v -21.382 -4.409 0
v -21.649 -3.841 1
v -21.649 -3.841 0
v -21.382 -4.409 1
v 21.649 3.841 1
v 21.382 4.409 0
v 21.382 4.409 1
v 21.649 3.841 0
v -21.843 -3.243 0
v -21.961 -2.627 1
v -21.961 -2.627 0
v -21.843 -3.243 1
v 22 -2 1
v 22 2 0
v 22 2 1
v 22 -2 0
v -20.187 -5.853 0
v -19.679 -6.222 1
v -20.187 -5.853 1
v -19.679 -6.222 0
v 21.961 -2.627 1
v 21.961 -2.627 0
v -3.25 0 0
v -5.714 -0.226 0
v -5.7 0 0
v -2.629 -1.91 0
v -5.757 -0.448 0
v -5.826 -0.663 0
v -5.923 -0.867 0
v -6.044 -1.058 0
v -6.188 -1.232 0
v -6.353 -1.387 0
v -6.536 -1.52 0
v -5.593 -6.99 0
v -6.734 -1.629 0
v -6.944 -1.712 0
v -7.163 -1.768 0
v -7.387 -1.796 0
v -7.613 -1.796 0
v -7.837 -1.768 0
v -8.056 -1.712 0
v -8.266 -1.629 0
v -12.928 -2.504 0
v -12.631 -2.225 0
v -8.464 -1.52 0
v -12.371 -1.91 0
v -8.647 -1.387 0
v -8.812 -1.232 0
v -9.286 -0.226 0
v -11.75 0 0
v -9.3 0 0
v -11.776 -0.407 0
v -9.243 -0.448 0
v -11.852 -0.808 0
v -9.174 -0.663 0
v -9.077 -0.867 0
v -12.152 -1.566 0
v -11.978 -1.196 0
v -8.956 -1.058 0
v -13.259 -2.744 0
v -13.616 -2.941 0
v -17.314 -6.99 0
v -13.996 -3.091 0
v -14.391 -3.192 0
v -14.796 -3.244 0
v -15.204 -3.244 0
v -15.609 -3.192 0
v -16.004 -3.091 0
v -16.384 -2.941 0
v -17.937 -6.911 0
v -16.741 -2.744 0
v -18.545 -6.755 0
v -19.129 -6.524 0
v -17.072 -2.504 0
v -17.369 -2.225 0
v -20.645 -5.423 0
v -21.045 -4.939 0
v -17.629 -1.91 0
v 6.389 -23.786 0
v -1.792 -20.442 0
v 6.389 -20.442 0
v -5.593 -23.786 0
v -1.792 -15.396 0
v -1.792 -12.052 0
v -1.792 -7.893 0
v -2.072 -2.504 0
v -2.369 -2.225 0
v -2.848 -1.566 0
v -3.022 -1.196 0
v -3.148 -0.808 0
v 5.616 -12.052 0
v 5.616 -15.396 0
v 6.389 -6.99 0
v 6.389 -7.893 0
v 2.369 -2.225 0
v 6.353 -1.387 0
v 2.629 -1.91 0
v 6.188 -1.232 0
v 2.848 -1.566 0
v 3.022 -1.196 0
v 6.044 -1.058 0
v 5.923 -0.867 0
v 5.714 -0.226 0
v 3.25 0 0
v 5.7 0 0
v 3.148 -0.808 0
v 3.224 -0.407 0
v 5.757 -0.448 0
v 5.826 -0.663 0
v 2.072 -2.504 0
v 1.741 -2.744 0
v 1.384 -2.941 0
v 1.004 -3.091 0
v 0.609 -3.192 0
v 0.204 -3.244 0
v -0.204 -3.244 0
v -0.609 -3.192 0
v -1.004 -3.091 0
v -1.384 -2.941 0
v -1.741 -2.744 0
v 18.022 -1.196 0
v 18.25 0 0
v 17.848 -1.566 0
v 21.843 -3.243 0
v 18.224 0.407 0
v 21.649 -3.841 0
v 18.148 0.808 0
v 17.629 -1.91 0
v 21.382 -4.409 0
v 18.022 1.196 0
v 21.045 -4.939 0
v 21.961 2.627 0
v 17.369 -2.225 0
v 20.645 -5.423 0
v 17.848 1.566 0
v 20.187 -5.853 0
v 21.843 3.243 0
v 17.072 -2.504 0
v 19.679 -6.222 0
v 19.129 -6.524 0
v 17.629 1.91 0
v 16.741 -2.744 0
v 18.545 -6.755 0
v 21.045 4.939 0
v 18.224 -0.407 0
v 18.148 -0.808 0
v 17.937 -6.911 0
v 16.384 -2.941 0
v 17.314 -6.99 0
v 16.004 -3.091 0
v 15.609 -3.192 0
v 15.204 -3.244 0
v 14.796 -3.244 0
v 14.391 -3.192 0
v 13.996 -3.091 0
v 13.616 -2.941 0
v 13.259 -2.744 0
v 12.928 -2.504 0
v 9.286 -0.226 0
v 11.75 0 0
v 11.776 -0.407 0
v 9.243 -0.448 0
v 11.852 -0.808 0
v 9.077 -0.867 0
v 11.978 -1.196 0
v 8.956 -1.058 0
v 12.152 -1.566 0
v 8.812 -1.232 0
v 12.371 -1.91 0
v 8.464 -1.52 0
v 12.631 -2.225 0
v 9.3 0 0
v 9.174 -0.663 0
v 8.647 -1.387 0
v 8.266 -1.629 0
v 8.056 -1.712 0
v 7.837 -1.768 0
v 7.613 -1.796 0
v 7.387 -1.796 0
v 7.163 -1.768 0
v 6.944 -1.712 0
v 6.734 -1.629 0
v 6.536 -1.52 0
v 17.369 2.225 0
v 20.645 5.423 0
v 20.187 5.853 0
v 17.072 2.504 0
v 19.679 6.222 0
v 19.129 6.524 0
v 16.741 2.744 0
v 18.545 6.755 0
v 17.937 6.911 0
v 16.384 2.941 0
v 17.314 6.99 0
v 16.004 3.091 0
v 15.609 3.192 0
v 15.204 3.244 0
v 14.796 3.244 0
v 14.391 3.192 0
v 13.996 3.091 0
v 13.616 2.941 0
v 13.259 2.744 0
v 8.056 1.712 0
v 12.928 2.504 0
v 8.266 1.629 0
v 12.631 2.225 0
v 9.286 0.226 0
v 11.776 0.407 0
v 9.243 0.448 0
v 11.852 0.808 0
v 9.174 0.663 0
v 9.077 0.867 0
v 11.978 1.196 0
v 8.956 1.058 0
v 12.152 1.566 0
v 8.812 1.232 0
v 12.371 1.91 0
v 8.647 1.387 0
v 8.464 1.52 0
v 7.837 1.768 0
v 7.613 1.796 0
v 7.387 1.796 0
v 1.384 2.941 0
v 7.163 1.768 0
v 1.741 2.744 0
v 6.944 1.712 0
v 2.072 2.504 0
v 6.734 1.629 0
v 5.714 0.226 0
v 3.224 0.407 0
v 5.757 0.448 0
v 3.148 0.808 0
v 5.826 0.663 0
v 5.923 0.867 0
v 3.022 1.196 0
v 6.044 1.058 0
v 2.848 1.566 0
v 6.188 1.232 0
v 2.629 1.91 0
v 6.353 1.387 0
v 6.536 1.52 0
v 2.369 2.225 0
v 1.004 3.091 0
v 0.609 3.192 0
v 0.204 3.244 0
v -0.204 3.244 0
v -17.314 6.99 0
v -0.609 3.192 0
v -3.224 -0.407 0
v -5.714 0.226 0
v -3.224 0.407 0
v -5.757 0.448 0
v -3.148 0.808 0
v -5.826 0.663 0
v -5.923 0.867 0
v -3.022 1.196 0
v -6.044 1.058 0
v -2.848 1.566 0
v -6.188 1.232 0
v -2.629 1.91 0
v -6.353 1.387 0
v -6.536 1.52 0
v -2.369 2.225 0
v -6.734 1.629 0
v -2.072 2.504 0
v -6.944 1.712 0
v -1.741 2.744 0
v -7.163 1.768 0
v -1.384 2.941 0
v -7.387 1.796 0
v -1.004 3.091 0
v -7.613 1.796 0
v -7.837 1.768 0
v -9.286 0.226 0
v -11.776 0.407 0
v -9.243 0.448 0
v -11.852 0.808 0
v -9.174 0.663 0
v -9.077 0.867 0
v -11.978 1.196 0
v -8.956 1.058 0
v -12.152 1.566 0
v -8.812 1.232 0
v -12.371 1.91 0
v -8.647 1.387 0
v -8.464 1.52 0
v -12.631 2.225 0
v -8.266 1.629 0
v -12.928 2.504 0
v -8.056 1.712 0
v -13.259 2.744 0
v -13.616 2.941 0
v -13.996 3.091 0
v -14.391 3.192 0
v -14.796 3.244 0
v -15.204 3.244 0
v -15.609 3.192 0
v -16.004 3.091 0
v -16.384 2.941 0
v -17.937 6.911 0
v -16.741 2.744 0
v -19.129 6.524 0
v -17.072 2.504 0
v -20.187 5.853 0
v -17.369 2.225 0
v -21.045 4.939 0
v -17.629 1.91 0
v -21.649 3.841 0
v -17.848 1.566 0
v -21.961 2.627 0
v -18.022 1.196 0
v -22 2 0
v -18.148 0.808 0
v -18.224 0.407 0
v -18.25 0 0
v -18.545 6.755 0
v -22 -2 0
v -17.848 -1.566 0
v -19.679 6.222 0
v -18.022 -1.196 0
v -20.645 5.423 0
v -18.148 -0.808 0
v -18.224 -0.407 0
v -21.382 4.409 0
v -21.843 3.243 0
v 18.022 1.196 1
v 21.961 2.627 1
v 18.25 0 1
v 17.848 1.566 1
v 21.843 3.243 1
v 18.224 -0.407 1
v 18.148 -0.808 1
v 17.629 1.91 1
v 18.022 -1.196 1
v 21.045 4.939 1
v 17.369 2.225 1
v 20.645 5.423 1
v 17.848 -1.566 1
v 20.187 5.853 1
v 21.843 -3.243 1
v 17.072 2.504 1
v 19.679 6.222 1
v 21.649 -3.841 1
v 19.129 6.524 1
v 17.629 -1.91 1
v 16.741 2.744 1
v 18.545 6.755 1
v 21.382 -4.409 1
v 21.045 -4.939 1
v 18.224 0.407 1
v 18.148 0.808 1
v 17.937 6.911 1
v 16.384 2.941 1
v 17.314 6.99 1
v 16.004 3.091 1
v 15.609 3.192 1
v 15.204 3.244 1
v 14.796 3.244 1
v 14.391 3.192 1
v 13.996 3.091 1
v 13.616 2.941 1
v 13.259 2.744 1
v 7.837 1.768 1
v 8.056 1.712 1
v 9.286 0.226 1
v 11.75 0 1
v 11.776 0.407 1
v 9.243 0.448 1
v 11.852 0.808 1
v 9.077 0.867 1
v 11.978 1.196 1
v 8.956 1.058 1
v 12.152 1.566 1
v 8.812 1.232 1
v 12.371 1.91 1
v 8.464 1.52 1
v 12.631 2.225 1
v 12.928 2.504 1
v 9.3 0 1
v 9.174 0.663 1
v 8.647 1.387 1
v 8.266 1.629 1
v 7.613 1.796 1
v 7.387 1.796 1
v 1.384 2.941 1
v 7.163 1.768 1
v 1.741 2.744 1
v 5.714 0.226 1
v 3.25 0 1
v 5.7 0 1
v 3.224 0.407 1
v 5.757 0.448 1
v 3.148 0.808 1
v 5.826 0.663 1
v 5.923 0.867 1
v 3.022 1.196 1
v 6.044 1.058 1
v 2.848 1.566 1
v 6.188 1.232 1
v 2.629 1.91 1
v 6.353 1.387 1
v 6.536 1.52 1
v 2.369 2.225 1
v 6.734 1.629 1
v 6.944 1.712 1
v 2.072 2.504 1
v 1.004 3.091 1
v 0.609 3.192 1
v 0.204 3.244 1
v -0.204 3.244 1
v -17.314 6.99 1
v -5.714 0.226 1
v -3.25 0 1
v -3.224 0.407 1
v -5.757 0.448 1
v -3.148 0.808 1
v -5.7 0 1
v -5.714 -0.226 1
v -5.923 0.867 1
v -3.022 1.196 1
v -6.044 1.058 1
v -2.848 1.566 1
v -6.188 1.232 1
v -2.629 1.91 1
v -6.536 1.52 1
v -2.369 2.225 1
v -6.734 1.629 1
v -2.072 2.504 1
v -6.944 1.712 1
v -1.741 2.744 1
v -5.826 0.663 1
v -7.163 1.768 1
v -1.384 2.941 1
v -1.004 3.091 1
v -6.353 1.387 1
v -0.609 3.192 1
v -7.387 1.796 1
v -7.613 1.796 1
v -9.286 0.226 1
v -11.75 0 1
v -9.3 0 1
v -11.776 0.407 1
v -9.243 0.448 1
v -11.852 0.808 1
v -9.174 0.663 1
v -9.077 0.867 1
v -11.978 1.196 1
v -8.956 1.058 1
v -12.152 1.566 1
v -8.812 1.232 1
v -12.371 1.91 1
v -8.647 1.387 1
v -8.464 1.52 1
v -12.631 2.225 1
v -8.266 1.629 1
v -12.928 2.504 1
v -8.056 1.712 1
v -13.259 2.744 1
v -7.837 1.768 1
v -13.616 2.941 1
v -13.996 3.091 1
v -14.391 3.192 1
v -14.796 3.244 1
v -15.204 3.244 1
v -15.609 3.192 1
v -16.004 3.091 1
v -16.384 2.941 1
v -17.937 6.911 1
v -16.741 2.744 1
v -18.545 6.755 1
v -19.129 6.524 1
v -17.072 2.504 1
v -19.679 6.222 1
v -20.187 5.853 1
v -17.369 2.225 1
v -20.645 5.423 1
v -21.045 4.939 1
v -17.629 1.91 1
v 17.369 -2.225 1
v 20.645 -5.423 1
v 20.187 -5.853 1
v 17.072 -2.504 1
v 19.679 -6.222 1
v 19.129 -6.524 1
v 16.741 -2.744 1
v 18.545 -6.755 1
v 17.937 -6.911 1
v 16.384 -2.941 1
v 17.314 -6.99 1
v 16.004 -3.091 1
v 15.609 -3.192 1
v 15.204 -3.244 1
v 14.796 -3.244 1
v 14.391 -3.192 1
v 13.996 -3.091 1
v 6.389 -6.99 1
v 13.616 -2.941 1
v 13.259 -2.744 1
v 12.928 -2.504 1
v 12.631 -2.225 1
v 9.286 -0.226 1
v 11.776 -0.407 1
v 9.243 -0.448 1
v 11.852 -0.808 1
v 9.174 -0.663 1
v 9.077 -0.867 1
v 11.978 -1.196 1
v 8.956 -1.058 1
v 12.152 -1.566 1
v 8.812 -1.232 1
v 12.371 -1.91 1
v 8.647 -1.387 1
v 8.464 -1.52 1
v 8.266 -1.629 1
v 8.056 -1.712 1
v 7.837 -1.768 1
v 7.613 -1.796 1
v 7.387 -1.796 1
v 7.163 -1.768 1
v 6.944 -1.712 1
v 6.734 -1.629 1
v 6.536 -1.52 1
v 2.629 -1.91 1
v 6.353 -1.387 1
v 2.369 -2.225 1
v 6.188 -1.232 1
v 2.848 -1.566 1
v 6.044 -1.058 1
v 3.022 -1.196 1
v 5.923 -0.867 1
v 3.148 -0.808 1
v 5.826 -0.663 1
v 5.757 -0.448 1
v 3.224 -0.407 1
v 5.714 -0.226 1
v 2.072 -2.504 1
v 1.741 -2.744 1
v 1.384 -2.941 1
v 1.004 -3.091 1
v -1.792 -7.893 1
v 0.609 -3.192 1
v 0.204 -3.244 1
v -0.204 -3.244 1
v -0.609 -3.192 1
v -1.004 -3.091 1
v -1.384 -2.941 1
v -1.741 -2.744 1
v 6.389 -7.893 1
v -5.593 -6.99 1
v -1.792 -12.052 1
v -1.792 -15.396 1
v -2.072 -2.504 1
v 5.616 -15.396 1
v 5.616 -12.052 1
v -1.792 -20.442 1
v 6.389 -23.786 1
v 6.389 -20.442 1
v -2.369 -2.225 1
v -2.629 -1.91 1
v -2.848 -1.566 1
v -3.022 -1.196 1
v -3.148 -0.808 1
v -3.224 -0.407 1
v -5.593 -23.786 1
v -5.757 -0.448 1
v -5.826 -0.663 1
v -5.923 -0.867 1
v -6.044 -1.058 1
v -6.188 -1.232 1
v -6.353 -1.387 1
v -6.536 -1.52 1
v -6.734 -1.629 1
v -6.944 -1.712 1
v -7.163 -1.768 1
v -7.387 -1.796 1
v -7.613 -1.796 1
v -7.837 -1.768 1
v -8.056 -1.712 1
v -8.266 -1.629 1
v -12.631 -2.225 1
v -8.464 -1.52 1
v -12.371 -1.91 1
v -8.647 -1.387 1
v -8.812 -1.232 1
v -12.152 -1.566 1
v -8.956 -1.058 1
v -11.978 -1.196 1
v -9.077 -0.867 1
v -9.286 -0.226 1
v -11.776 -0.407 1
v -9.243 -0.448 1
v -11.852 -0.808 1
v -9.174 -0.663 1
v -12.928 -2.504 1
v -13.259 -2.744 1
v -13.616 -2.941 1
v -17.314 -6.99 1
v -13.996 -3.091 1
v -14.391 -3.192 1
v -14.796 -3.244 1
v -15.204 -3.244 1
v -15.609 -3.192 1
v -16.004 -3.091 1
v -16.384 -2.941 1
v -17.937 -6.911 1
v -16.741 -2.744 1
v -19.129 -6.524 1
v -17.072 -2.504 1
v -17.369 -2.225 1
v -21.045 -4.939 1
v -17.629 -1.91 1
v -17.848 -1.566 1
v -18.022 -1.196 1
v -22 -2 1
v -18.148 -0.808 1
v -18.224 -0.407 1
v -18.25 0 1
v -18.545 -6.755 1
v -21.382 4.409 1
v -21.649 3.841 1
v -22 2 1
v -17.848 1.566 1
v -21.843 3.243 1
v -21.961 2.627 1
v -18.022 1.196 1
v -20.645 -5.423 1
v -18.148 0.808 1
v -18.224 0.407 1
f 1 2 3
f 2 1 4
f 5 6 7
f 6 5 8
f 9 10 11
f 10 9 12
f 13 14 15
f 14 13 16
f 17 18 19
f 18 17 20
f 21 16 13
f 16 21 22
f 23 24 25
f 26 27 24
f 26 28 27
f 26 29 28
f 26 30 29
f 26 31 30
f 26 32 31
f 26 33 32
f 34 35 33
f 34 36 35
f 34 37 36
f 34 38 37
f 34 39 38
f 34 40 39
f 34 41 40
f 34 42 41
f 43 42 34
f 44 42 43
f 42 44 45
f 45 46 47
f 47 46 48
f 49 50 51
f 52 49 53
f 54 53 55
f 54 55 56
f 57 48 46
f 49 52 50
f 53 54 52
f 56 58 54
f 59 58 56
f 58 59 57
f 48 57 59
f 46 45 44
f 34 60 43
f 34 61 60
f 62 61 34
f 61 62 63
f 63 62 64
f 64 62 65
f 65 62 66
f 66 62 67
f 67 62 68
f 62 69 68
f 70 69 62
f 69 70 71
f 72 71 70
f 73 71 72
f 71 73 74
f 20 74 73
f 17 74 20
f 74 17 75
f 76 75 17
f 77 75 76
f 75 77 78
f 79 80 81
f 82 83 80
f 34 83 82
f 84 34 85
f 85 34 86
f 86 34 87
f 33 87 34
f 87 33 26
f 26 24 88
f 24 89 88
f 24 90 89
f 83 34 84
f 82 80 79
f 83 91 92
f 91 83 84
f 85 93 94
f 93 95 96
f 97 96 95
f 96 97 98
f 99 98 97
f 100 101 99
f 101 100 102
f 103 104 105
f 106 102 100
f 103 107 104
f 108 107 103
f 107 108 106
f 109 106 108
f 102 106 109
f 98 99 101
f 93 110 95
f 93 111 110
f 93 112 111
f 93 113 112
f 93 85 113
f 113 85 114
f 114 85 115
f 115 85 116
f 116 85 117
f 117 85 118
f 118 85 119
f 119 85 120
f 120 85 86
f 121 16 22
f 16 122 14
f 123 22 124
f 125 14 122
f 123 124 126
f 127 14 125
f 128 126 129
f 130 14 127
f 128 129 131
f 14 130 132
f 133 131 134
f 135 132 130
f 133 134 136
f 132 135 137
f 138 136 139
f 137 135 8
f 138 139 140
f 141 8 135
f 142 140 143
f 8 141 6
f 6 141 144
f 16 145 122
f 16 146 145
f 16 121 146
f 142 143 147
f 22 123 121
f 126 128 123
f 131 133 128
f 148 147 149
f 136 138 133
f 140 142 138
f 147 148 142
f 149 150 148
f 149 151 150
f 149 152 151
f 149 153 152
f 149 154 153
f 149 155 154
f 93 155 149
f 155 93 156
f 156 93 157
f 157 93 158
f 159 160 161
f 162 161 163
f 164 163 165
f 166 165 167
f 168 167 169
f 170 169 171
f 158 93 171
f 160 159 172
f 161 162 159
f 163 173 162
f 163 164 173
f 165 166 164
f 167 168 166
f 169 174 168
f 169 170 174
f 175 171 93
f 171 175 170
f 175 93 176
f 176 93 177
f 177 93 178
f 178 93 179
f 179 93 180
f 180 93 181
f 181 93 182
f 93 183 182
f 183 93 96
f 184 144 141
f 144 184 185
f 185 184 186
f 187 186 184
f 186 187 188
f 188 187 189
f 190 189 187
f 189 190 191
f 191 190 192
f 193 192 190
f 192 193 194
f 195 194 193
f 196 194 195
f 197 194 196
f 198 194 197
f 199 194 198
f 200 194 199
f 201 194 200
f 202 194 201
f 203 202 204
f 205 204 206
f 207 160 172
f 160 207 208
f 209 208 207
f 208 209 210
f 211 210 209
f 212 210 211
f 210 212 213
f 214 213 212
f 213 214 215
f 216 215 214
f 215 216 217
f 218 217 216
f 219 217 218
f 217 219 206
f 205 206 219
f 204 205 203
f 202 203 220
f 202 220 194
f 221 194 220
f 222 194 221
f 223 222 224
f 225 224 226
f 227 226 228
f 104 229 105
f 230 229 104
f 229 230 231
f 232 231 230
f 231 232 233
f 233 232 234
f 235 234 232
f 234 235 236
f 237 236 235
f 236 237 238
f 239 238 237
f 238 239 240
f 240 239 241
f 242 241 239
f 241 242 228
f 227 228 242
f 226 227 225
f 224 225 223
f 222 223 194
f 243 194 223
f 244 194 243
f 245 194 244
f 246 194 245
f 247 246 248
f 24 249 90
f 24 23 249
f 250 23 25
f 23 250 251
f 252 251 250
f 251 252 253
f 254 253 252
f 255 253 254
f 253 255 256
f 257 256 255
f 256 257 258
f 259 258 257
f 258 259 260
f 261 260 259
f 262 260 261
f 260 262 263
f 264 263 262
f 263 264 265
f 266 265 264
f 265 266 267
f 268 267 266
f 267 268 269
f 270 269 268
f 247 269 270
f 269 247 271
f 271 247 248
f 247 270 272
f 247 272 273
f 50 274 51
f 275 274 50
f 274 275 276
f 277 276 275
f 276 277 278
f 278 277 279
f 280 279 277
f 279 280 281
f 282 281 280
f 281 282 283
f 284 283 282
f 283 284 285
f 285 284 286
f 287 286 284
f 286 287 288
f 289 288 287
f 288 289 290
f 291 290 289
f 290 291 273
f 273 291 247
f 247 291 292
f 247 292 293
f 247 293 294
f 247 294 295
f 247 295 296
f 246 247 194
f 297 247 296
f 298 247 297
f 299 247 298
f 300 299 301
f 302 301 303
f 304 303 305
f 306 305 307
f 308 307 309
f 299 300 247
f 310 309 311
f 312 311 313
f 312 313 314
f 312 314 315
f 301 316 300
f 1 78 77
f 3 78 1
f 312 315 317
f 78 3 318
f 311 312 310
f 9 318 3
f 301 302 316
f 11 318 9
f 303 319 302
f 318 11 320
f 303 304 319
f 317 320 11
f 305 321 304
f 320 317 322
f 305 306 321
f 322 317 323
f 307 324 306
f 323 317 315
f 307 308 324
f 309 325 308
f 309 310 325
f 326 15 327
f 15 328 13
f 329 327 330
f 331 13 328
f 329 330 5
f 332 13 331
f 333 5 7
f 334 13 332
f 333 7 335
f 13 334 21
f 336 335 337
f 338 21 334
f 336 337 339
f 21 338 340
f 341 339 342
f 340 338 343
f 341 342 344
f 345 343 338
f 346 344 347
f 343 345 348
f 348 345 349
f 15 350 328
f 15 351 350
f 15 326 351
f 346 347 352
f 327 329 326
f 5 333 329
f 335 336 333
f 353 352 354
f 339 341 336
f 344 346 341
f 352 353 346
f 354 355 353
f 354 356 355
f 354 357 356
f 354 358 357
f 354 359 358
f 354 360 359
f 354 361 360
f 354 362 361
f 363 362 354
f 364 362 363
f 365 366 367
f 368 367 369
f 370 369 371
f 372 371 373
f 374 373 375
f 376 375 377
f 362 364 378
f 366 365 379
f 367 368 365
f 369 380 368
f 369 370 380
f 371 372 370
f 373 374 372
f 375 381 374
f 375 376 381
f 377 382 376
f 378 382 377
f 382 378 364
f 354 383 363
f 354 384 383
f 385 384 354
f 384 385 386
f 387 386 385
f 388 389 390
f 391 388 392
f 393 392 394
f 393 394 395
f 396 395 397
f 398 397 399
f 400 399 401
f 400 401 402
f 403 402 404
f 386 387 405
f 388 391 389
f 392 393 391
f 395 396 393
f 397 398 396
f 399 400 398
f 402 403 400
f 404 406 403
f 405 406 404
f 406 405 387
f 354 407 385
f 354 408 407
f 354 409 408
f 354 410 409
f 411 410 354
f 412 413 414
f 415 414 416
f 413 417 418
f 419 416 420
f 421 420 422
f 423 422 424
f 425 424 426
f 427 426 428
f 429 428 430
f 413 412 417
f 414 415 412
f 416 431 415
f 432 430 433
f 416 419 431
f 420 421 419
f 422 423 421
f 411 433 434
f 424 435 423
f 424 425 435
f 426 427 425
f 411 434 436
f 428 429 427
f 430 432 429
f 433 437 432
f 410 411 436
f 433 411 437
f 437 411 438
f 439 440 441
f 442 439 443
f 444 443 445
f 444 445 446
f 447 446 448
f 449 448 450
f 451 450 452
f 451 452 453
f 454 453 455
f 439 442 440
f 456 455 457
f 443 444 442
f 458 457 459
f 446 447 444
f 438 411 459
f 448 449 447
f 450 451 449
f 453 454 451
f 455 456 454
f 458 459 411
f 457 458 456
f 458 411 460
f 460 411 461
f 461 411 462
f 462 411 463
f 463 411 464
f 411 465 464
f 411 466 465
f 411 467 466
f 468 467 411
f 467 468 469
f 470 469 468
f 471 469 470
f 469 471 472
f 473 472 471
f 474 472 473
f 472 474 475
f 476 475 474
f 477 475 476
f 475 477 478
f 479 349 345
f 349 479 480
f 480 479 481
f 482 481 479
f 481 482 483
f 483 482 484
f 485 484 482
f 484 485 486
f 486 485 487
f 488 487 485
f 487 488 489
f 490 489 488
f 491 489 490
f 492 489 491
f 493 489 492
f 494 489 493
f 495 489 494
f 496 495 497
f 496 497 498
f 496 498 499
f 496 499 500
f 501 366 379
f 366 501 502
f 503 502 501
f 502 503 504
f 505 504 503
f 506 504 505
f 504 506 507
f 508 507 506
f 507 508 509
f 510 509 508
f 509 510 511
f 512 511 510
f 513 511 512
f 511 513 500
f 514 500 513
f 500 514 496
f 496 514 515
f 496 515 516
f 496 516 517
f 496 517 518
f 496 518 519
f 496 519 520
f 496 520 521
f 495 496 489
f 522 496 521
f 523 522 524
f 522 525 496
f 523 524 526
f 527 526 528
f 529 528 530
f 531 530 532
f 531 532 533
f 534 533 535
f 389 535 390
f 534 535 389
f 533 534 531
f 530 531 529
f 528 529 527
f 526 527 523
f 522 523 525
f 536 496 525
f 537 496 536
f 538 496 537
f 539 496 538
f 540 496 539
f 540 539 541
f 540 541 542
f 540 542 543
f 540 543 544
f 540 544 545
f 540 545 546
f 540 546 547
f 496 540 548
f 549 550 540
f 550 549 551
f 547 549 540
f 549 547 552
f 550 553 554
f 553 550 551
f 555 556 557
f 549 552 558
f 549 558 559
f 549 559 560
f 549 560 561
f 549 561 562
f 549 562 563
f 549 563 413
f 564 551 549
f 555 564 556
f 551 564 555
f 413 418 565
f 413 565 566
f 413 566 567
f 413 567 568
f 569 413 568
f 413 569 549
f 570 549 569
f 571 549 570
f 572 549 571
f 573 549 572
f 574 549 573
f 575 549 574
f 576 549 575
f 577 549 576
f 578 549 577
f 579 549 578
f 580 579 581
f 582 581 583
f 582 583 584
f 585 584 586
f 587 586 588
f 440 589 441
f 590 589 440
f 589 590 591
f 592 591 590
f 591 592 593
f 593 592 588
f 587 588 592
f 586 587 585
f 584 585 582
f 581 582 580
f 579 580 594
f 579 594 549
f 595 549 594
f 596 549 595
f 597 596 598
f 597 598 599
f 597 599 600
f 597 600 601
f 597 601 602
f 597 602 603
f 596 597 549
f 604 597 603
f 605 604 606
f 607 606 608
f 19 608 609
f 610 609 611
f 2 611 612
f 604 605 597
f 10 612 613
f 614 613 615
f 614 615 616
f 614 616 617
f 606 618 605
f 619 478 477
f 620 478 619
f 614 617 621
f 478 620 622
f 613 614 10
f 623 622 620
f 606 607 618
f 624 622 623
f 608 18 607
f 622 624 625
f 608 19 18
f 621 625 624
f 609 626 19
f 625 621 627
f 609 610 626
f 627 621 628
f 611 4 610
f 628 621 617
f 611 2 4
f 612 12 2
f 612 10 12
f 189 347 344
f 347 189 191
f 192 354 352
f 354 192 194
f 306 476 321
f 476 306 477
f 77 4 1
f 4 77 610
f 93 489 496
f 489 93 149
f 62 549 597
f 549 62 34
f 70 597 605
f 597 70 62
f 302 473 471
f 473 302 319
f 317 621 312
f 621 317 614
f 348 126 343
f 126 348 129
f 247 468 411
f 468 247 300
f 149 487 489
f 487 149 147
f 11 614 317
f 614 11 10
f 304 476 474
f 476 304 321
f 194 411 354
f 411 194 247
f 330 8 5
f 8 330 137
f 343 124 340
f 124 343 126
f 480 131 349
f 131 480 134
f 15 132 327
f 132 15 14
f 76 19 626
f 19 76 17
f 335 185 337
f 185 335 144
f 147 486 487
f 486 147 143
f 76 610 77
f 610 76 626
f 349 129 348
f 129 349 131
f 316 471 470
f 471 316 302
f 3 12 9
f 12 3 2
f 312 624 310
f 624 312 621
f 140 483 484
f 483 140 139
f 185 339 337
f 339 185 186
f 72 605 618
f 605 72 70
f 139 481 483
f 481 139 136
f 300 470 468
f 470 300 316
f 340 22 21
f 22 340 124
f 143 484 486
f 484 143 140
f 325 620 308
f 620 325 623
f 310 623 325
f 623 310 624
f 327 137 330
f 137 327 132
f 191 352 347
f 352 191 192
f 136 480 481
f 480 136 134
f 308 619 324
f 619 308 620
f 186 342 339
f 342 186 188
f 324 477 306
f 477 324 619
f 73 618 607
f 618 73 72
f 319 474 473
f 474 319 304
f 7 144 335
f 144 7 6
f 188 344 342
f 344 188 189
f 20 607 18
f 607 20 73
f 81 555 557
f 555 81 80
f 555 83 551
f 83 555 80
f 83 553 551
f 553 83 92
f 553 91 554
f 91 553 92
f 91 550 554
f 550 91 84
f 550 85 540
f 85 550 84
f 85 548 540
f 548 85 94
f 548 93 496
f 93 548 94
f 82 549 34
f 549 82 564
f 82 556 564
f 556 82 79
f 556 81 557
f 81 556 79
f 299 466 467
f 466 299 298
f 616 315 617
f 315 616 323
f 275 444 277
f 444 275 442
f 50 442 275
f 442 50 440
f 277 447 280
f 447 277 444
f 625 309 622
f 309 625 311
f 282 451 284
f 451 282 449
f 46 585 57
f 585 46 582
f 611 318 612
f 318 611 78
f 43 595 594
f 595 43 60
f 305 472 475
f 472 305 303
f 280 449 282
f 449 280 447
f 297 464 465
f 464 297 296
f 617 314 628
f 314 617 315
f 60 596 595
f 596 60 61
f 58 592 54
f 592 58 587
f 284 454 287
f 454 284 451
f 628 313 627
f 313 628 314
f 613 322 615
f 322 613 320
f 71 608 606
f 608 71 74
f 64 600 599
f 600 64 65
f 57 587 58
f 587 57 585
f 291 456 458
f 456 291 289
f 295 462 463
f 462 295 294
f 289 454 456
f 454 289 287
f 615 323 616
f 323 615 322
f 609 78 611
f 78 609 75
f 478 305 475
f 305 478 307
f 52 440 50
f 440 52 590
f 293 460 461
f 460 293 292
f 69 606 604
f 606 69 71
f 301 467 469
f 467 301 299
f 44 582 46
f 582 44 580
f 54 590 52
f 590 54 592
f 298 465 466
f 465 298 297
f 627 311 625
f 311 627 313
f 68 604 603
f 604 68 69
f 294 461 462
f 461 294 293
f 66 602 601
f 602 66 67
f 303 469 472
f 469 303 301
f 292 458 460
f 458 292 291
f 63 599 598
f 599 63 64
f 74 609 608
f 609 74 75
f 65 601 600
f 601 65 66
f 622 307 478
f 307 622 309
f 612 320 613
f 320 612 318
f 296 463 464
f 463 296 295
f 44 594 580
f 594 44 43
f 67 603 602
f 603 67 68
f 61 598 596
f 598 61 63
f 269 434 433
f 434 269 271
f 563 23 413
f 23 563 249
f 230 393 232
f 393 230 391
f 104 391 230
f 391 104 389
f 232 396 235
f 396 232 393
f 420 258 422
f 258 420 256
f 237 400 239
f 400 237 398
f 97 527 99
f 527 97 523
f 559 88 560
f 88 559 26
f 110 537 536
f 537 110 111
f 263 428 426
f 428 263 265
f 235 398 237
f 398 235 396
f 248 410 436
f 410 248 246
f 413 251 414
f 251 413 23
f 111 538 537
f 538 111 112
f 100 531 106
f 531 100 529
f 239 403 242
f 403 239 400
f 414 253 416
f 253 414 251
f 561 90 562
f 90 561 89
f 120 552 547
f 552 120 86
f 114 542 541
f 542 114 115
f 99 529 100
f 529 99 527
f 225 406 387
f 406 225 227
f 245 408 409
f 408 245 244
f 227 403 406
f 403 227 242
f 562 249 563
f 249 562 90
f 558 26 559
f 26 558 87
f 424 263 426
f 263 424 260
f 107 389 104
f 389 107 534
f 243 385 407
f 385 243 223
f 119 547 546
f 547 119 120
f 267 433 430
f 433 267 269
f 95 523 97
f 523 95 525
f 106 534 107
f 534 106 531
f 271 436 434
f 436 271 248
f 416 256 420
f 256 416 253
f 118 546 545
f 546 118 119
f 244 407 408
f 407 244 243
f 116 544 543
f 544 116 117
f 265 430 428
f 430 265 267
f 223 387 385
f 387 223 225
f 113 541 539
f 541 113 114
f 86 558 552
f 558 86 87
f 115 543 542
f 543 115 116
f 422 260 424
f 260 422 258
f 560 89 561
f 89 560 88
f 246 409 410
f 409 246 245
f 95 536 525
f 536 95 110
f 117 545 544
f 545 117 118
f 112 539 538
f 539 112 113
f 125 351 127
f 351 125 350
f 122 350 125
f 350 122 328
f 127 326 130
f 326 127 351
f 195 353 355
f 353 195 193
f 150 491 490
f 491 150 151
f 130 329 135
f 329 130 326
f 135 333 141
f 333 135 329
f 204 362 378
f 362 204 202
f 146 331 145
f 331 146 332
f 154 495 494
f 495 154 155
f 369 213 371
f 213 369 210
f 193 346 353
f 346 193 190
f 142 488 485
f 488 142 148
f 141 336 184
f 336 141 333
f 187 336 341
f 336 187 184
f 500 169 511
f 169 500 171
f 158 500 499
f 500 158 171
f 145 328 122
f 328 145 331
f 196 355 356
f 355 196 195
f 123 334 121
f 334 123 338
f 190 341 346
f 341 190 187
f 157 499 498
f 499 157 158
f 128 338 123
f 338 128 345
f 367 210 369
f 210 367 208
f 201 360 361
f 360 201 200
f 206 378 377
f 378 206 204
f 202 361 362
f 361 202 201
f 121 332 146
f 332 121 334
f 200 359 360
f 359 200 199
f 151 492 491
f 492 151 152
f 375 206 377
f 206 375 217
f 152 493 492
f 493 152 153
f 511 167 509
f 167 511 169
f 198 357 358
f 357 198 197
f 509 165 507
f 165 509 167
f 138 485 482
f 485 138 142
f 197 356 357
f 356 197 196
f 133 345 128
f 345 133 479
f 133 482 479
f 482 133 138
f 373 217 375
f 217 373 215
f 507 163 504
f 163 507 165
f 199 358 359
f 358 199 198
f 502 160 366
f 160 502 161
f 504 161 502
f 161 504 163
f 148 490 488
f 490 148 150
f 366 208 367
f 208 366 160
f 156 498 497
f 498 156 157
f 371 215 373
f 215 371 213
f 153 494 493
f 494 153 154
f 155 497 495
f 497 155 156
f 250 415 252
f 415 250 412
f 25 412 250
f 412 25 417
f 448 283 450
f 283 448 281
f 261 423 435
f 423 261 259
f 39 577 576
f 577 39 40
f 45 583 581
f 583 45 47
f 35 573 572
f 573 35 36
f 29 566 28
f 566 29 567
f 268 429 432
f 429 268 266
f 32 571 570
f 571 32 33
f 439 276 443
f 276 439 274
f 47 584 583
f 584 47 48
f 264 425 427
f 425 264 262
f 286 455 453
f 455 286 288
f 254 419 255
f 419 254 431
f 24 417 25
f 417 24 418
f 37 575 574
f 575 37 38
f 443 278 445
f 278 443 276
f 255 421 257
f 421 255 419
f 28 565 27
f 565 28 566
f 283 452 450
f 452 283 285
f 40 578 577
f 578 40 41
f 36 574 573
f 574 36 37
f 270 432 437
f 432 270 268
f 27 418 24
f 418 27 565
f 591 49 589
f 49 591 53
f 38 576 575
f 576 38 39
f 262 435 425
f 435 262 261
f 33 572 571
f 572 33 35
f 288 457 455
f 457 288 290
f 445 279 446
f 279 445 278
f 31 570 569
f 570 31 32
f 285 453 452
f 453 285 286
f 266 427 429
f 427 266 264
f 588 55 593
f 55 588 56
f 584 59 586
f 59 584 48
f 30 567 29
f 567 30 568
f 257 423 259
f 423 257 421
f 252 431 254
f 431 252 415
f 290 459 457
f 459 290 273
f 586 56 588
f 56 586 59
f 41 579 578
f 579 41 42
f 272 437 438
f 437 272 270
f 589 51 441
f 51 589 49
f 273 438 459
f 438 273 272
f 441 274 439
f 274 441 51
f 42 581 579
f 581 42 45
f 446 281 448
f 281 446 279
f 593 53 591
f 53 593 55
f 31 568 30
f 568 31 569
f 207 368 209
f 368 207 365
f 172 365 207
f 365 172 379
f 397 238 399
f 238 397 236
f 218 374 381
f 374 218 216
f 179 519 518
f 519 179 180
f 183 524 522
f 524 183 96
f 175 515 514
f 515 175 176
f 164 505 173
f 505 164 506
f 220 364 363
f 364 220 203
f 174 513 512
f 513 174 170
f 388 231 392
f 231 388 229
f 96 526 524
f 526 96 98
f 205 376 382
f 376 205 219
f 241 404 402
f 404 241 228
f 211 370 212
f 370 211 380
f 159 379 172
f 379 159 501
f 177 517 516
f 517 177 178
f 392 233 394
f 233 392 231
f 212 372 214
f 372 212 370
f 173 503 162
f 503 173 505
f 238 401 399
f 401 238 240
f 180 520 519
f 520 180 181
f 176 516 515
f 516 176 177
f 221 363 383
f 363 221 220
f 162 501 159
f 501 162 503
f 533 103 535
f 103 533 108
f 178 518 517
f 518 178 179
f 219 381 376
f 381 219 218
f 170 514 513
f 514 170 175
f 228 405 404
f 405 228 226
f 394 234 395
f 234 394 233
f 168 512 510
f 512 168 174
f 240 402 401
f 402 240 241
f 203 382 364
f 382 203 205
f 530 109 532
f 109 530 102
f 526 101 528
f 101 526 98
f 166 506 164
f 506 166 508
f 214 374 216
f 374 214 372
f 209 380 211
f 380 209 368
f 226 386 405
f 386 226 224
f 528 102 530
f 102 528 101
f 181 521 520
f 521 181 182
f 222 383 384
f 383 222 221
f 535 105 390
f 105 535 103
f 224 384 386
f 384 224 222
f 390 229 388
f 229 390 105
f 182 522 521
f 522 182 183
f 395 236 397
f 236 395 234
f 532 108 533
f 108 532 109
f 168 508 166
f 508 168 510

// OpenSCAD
$fn = 50;


difference() {
	union() {
		hull() {
			translate(v = [-17.0000000000, 2.0000000000, 0]) {
				cylinder(h = 1, r = 5);
			}
			translate(v = [17.0000000000, 2.0000000000, 0]) {
				cylinder(h = 1, r = 5);
			}
			translate(v = [-17.0000000000, -2.0000000000, 0]) {
				cylinder(h = 1, r = 5);
			}
			translate(v = [17.0000000000, -2.0000000000, 0]) {
				cylinder(h = 1, r = 5);
			}
		}
		translate(v = [0, -5, 0]) {
			linear_extrude(height = 1) {
				text(font = "DejaVu Sans Mono:style=Bold", halign = "center", size = 19.0000000000, text = "E", valign = "top");
			}
		}
	}
	union() {
		translate(v = [-15.0000000000, 0.0000000000, 0]) {
			translate(v = [0, 0, -100]) {
				cylinder(h = 200, r = 3.2500000000);
			}
		}
		translate(v = [0, 0, -100]) {
			cylinder(h = 200, r = 3.2500000000);
		}
		translate(v = [15.0000000000, 0.0000000000, 0]) {
			translate(v = [0, 0, -100]) {
				cylinder(h = 200, r = 3.2500000000);
			}
		}
		translate(v = [-15.0000000000, 0.0000000000, 0]) {
			translate(v = [0, 0, -100]) {
				cylinder(h = 200, r = 1.8000000000);
			}
		}
		translate(v = [-7.5000000000, 0.0000000000, 0]) {
			translate(v = [0, 0, -100]) {
				cylinder(h = 200, r = 1.8000000000);
			}
		}
		translate(v = [0, 0, -100]) {
			cylinder(h = 200, r = 1.8000000000);
		}
		translate(v = [7.5000000000, 0.0000000000, 0]) {
			translate(v = [0, 0, -100]) {
				cylinder(h = 200, r = 1.8000000000);
			}
		}
		translate(v = [15.0000000000, 0.0000000000, 0]) {
			translate(v = [0, 0, -100]) {
				cylinder(h = 200, r = 1.8000000000);
			}
		}
	}
}
